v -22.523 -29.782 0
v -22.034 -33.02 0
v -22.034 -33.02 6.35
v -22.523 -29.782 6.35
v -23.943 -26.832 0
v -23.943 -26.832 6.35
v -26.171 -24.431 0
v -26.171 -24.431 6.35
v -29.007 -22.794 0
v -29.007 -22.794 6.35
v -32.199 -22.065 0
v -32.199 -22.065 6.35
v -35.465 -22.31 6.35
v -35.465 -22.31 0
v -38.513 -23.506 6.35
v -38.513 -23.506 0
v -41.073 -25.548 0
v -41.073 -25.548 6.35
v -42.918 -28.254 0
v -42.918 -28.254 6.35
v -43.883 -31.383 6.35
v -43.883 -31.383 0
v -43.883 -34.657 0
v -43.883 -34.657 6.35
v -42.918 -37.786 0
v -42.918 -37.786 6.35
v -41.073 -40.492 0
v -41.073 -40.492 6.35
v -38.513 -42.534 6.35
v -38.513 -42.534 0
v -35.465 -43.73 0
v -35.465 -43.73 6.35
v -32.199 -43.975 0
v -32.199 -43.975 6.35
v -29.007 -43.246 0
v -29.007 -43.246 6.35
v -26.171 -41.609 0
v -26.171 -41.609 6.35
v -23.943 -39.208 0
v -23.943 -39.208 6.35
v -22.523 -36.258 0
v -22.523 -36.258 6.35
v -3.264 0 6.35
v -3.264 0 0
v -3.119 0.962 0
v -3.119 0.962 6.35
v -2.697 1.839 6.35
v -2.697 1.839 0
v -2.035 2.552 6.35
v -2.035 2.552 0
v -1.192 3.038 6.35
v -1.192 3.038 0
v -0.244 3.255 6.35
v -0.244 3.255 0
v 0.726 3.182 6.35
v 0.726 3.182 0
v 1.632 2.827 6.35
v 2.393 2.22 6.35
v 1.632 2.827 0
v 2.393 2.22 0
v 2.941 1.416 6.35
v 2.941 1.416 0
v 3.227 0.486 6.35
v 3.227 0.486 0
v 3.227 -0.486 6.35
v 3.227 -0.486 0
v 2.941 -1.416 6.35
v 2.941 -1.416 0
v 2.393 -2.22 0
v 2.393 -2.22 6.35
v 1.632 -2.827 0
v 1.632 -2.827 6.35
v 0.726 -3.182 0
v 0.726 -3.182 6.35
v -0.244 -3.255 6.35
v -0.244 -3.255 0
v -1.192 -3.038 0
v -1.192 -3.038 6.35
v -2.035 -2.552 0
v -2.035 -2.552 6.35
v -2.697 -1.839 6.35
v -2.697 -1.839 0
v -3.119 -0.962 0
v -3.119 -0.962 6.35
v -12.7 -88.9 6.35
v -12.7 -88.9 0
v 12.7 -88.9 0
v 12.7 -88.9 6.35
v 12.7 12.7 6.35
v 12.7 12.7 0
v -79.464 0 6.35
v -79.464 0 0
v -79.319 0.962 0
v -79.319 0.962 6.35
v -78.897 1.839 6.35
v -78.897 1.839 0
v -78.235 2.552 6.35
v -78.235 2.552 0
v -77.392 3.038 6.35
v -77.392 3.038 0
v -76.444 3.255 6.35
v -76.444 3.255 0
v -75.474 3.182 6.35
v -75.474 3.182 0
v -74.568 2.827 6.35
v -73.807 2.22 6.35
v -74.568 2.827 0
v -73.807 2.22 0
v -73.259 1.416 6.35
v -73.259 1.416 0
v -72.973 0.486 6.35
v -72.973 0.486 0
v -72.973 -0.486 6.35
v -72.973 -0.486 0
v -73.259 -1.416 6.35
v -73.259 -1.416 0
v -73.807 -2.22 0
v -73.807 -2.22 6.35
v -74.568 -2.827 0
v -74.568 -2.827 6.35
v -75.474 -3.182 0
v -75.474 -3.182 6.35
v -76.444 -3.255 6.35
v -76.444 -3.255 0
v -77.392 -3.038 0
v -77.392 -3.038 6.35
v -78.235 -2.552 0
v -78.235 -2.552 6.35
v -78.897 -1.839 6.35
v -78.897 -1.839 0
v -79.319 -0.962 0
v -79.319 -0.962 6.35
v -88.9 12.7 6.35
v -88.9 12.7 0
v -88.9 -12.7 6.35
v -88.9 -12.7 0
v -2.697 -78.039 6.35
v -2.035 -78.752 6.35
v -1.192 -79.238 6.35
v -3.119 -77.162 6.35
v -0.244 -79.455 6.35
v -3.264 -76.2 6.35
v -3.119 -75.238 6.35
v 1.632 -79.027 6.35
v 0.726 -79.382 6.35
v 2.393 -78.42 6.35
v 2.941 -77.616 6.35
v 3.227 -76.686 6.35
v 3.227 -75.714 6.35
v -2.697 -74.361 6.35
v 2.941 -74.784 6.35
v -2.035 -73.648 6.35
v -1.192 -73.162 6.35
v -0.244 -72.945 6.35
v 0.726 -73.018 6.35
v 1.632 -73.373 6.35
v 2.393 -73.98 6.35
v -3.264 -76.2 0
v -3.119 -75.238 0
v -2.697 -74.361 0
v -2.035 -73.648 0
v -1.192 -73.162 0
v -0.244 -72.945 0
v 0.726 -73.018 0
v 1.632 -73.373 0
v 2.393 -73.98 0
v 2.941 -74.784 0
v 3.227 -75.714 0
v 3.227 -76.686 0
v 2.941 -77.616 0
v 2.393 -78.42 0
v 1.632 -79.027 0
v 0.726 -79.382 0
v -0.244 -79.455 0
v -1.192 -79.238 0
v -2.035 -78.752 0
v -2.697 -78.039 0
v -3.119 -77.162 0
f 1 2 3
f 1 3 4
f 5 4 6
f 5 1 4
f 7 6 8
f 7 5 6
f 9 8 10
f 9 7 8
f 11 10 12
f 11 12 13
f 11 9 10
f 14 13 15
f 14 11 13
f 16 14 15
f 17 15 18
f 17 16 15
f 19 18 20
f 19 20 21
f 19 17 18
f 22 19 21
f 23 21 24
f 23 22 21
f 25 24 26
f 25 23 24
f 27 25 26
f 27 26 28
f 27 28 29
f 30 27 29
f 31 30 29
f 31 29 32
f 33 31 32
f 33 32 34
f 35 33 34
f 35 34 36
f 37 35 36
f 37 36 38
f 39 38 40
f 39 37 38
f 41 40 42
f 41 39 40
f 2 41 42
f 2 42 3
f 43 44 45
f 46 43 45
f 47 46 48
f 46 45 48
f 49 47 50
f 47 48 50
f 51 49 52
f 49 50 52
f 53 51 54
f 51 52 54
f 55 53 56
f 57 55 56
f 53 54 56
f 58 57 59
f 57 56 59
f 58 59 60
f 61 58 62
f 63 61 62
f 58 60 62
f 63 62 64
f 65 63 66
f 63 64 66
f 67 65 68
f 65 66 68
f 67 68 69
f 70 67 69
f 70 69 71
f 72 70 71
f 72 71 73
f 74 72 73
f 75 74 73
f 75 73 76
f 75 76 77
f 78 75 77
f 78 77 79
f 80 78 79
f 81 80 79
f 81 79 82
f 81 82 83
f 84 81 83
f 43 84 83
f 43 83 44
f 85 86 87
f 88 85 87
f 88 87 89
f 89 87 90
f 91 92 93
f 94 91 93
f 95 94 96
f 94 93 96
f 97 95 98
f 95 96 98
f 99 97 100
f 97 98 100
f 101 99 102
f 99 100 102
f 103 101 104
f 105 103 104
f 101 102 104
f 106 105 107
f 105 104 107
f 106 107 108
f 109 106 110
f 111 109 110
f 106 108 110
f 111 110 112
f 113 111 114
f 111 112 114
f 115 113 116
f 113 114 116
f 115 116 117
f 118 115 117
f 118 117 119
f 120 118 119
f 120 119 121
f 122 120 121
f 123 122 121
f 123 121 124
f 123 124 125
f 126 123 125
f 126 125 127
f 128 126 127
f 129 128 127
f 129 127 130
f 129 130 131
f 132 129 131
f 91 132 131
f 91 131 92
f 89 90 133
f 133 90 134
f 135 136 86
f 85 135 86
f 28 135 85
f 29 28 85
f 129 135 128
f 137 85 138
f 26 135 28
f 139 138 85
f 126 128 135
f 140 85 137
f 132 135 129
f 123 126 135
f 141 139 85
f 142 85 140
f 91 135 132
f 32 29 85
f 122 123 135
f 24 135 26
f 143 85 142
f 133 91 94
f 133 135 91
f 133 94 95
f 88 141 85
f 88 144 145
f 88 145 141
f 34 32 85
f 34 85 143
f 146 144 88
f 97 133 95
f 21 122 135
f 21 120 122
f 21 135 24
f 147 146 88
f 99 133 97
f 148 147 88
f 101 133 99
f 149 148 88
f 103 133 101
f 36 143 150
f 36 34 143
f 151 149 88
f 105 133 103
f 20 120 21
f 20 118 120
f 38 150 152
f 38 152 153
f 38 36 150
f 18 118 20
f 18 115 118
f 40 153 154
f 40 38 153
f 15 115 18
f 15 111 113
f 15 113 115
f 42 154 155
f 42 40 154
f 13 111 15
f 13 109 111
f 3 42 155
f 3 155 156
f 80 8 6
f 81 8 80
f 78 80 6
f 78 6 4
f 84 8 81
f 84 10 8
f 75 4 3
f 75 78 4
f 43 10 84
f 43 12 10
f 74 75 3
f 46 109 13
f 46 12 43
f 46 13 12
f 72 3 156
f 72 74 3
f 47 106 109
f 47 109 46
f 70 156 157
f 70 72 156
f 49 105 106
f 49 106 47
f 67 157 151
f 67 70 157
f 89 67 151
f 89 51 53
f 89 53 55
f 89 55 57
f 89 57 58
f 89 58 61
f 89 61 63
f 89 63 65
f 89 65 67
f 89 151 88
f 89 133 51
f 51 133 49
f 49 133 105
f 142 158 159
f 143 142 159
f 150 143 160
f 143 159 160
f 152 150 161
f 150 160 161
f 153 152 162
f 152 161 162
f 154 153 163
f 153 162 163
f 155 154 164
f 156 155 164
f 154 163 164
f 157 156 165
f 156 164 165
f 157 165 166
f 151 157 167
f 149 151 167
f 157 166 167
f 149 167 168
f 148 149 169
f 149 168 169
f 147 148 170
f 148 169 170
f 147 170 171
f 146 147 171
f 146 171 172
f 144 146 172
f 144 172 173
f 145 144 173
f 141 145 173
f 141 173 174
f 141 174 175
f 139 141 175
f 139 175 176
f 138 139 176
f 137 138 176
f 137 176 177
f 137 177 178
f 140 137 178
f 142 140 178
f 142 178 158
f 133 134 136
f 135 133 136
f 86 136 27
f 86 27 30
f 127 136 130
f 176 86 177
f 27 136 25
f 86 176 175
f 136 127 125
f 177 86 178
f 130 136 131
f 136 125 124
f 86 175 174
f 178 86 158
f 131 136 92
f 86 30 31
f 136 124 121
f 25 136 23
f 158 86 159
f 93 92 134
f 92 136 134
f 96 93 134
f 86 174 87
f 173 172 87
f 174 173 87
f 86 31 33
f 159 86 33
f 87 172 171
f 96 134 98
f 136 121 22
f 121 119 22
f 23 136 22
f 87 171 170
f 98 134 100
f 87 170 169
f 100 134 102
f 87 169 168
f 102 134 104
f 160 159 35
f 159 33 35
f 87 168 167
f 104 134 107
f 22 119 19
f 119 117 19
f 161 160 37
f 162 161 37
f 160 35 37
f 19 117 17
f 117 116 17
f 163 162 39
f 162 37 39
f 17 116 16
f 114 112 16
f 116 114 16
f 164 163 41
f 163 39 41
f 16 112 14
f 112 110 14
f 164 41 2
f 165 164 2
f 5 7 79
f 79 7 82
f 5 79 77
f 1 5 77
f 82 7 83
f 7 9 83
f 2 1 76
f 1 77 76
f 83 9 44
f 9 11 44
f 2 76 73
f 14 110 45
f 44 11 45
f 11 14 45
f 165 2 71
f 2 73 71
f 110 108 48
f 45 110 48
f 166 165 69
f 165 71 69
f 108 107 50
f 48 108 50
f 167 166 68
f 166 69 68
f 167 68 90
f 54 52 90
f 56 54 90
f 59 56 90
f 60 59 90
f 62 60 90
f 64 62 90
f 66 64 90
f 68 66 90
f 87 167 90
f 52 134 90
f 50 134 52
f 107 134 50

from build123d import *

# Parameters (mm, degrees)
SKETCH1_R               = 10.9855
BOSS_EXTRUDE1_DEPTH     = 6.35
F_1_4_CLEARANCE_HOLE1_D = 6.5278


with BuildPart() as part:
    # Sketch1 → Boss-Extrude1 (new body)
    with BuildSketch(Plane.XY):
        Polygon((-88.9, 12.7), (-88.9, -12.7), (-12.7, -88.9), (12.7, -88.9), (12.7, 12.7), align=None)
        with Locations((-33.02, -33.02)):
            Circle(SKETCH1_R, mode=Mode.SUBTRACT)
    extrude(amount=BOSS_EXTRUDE1_DEPTH)

    # 1/4 Clearance Hole1 (through all)
    with Locations(Plane.XY.offset(6.35)):
        with Locations((0, 0), (-76.2, 0), (0, -76.2)):
            Hole(F_1_4_CLEARANCE_HOLE1_D / 2)


solid = part.part
